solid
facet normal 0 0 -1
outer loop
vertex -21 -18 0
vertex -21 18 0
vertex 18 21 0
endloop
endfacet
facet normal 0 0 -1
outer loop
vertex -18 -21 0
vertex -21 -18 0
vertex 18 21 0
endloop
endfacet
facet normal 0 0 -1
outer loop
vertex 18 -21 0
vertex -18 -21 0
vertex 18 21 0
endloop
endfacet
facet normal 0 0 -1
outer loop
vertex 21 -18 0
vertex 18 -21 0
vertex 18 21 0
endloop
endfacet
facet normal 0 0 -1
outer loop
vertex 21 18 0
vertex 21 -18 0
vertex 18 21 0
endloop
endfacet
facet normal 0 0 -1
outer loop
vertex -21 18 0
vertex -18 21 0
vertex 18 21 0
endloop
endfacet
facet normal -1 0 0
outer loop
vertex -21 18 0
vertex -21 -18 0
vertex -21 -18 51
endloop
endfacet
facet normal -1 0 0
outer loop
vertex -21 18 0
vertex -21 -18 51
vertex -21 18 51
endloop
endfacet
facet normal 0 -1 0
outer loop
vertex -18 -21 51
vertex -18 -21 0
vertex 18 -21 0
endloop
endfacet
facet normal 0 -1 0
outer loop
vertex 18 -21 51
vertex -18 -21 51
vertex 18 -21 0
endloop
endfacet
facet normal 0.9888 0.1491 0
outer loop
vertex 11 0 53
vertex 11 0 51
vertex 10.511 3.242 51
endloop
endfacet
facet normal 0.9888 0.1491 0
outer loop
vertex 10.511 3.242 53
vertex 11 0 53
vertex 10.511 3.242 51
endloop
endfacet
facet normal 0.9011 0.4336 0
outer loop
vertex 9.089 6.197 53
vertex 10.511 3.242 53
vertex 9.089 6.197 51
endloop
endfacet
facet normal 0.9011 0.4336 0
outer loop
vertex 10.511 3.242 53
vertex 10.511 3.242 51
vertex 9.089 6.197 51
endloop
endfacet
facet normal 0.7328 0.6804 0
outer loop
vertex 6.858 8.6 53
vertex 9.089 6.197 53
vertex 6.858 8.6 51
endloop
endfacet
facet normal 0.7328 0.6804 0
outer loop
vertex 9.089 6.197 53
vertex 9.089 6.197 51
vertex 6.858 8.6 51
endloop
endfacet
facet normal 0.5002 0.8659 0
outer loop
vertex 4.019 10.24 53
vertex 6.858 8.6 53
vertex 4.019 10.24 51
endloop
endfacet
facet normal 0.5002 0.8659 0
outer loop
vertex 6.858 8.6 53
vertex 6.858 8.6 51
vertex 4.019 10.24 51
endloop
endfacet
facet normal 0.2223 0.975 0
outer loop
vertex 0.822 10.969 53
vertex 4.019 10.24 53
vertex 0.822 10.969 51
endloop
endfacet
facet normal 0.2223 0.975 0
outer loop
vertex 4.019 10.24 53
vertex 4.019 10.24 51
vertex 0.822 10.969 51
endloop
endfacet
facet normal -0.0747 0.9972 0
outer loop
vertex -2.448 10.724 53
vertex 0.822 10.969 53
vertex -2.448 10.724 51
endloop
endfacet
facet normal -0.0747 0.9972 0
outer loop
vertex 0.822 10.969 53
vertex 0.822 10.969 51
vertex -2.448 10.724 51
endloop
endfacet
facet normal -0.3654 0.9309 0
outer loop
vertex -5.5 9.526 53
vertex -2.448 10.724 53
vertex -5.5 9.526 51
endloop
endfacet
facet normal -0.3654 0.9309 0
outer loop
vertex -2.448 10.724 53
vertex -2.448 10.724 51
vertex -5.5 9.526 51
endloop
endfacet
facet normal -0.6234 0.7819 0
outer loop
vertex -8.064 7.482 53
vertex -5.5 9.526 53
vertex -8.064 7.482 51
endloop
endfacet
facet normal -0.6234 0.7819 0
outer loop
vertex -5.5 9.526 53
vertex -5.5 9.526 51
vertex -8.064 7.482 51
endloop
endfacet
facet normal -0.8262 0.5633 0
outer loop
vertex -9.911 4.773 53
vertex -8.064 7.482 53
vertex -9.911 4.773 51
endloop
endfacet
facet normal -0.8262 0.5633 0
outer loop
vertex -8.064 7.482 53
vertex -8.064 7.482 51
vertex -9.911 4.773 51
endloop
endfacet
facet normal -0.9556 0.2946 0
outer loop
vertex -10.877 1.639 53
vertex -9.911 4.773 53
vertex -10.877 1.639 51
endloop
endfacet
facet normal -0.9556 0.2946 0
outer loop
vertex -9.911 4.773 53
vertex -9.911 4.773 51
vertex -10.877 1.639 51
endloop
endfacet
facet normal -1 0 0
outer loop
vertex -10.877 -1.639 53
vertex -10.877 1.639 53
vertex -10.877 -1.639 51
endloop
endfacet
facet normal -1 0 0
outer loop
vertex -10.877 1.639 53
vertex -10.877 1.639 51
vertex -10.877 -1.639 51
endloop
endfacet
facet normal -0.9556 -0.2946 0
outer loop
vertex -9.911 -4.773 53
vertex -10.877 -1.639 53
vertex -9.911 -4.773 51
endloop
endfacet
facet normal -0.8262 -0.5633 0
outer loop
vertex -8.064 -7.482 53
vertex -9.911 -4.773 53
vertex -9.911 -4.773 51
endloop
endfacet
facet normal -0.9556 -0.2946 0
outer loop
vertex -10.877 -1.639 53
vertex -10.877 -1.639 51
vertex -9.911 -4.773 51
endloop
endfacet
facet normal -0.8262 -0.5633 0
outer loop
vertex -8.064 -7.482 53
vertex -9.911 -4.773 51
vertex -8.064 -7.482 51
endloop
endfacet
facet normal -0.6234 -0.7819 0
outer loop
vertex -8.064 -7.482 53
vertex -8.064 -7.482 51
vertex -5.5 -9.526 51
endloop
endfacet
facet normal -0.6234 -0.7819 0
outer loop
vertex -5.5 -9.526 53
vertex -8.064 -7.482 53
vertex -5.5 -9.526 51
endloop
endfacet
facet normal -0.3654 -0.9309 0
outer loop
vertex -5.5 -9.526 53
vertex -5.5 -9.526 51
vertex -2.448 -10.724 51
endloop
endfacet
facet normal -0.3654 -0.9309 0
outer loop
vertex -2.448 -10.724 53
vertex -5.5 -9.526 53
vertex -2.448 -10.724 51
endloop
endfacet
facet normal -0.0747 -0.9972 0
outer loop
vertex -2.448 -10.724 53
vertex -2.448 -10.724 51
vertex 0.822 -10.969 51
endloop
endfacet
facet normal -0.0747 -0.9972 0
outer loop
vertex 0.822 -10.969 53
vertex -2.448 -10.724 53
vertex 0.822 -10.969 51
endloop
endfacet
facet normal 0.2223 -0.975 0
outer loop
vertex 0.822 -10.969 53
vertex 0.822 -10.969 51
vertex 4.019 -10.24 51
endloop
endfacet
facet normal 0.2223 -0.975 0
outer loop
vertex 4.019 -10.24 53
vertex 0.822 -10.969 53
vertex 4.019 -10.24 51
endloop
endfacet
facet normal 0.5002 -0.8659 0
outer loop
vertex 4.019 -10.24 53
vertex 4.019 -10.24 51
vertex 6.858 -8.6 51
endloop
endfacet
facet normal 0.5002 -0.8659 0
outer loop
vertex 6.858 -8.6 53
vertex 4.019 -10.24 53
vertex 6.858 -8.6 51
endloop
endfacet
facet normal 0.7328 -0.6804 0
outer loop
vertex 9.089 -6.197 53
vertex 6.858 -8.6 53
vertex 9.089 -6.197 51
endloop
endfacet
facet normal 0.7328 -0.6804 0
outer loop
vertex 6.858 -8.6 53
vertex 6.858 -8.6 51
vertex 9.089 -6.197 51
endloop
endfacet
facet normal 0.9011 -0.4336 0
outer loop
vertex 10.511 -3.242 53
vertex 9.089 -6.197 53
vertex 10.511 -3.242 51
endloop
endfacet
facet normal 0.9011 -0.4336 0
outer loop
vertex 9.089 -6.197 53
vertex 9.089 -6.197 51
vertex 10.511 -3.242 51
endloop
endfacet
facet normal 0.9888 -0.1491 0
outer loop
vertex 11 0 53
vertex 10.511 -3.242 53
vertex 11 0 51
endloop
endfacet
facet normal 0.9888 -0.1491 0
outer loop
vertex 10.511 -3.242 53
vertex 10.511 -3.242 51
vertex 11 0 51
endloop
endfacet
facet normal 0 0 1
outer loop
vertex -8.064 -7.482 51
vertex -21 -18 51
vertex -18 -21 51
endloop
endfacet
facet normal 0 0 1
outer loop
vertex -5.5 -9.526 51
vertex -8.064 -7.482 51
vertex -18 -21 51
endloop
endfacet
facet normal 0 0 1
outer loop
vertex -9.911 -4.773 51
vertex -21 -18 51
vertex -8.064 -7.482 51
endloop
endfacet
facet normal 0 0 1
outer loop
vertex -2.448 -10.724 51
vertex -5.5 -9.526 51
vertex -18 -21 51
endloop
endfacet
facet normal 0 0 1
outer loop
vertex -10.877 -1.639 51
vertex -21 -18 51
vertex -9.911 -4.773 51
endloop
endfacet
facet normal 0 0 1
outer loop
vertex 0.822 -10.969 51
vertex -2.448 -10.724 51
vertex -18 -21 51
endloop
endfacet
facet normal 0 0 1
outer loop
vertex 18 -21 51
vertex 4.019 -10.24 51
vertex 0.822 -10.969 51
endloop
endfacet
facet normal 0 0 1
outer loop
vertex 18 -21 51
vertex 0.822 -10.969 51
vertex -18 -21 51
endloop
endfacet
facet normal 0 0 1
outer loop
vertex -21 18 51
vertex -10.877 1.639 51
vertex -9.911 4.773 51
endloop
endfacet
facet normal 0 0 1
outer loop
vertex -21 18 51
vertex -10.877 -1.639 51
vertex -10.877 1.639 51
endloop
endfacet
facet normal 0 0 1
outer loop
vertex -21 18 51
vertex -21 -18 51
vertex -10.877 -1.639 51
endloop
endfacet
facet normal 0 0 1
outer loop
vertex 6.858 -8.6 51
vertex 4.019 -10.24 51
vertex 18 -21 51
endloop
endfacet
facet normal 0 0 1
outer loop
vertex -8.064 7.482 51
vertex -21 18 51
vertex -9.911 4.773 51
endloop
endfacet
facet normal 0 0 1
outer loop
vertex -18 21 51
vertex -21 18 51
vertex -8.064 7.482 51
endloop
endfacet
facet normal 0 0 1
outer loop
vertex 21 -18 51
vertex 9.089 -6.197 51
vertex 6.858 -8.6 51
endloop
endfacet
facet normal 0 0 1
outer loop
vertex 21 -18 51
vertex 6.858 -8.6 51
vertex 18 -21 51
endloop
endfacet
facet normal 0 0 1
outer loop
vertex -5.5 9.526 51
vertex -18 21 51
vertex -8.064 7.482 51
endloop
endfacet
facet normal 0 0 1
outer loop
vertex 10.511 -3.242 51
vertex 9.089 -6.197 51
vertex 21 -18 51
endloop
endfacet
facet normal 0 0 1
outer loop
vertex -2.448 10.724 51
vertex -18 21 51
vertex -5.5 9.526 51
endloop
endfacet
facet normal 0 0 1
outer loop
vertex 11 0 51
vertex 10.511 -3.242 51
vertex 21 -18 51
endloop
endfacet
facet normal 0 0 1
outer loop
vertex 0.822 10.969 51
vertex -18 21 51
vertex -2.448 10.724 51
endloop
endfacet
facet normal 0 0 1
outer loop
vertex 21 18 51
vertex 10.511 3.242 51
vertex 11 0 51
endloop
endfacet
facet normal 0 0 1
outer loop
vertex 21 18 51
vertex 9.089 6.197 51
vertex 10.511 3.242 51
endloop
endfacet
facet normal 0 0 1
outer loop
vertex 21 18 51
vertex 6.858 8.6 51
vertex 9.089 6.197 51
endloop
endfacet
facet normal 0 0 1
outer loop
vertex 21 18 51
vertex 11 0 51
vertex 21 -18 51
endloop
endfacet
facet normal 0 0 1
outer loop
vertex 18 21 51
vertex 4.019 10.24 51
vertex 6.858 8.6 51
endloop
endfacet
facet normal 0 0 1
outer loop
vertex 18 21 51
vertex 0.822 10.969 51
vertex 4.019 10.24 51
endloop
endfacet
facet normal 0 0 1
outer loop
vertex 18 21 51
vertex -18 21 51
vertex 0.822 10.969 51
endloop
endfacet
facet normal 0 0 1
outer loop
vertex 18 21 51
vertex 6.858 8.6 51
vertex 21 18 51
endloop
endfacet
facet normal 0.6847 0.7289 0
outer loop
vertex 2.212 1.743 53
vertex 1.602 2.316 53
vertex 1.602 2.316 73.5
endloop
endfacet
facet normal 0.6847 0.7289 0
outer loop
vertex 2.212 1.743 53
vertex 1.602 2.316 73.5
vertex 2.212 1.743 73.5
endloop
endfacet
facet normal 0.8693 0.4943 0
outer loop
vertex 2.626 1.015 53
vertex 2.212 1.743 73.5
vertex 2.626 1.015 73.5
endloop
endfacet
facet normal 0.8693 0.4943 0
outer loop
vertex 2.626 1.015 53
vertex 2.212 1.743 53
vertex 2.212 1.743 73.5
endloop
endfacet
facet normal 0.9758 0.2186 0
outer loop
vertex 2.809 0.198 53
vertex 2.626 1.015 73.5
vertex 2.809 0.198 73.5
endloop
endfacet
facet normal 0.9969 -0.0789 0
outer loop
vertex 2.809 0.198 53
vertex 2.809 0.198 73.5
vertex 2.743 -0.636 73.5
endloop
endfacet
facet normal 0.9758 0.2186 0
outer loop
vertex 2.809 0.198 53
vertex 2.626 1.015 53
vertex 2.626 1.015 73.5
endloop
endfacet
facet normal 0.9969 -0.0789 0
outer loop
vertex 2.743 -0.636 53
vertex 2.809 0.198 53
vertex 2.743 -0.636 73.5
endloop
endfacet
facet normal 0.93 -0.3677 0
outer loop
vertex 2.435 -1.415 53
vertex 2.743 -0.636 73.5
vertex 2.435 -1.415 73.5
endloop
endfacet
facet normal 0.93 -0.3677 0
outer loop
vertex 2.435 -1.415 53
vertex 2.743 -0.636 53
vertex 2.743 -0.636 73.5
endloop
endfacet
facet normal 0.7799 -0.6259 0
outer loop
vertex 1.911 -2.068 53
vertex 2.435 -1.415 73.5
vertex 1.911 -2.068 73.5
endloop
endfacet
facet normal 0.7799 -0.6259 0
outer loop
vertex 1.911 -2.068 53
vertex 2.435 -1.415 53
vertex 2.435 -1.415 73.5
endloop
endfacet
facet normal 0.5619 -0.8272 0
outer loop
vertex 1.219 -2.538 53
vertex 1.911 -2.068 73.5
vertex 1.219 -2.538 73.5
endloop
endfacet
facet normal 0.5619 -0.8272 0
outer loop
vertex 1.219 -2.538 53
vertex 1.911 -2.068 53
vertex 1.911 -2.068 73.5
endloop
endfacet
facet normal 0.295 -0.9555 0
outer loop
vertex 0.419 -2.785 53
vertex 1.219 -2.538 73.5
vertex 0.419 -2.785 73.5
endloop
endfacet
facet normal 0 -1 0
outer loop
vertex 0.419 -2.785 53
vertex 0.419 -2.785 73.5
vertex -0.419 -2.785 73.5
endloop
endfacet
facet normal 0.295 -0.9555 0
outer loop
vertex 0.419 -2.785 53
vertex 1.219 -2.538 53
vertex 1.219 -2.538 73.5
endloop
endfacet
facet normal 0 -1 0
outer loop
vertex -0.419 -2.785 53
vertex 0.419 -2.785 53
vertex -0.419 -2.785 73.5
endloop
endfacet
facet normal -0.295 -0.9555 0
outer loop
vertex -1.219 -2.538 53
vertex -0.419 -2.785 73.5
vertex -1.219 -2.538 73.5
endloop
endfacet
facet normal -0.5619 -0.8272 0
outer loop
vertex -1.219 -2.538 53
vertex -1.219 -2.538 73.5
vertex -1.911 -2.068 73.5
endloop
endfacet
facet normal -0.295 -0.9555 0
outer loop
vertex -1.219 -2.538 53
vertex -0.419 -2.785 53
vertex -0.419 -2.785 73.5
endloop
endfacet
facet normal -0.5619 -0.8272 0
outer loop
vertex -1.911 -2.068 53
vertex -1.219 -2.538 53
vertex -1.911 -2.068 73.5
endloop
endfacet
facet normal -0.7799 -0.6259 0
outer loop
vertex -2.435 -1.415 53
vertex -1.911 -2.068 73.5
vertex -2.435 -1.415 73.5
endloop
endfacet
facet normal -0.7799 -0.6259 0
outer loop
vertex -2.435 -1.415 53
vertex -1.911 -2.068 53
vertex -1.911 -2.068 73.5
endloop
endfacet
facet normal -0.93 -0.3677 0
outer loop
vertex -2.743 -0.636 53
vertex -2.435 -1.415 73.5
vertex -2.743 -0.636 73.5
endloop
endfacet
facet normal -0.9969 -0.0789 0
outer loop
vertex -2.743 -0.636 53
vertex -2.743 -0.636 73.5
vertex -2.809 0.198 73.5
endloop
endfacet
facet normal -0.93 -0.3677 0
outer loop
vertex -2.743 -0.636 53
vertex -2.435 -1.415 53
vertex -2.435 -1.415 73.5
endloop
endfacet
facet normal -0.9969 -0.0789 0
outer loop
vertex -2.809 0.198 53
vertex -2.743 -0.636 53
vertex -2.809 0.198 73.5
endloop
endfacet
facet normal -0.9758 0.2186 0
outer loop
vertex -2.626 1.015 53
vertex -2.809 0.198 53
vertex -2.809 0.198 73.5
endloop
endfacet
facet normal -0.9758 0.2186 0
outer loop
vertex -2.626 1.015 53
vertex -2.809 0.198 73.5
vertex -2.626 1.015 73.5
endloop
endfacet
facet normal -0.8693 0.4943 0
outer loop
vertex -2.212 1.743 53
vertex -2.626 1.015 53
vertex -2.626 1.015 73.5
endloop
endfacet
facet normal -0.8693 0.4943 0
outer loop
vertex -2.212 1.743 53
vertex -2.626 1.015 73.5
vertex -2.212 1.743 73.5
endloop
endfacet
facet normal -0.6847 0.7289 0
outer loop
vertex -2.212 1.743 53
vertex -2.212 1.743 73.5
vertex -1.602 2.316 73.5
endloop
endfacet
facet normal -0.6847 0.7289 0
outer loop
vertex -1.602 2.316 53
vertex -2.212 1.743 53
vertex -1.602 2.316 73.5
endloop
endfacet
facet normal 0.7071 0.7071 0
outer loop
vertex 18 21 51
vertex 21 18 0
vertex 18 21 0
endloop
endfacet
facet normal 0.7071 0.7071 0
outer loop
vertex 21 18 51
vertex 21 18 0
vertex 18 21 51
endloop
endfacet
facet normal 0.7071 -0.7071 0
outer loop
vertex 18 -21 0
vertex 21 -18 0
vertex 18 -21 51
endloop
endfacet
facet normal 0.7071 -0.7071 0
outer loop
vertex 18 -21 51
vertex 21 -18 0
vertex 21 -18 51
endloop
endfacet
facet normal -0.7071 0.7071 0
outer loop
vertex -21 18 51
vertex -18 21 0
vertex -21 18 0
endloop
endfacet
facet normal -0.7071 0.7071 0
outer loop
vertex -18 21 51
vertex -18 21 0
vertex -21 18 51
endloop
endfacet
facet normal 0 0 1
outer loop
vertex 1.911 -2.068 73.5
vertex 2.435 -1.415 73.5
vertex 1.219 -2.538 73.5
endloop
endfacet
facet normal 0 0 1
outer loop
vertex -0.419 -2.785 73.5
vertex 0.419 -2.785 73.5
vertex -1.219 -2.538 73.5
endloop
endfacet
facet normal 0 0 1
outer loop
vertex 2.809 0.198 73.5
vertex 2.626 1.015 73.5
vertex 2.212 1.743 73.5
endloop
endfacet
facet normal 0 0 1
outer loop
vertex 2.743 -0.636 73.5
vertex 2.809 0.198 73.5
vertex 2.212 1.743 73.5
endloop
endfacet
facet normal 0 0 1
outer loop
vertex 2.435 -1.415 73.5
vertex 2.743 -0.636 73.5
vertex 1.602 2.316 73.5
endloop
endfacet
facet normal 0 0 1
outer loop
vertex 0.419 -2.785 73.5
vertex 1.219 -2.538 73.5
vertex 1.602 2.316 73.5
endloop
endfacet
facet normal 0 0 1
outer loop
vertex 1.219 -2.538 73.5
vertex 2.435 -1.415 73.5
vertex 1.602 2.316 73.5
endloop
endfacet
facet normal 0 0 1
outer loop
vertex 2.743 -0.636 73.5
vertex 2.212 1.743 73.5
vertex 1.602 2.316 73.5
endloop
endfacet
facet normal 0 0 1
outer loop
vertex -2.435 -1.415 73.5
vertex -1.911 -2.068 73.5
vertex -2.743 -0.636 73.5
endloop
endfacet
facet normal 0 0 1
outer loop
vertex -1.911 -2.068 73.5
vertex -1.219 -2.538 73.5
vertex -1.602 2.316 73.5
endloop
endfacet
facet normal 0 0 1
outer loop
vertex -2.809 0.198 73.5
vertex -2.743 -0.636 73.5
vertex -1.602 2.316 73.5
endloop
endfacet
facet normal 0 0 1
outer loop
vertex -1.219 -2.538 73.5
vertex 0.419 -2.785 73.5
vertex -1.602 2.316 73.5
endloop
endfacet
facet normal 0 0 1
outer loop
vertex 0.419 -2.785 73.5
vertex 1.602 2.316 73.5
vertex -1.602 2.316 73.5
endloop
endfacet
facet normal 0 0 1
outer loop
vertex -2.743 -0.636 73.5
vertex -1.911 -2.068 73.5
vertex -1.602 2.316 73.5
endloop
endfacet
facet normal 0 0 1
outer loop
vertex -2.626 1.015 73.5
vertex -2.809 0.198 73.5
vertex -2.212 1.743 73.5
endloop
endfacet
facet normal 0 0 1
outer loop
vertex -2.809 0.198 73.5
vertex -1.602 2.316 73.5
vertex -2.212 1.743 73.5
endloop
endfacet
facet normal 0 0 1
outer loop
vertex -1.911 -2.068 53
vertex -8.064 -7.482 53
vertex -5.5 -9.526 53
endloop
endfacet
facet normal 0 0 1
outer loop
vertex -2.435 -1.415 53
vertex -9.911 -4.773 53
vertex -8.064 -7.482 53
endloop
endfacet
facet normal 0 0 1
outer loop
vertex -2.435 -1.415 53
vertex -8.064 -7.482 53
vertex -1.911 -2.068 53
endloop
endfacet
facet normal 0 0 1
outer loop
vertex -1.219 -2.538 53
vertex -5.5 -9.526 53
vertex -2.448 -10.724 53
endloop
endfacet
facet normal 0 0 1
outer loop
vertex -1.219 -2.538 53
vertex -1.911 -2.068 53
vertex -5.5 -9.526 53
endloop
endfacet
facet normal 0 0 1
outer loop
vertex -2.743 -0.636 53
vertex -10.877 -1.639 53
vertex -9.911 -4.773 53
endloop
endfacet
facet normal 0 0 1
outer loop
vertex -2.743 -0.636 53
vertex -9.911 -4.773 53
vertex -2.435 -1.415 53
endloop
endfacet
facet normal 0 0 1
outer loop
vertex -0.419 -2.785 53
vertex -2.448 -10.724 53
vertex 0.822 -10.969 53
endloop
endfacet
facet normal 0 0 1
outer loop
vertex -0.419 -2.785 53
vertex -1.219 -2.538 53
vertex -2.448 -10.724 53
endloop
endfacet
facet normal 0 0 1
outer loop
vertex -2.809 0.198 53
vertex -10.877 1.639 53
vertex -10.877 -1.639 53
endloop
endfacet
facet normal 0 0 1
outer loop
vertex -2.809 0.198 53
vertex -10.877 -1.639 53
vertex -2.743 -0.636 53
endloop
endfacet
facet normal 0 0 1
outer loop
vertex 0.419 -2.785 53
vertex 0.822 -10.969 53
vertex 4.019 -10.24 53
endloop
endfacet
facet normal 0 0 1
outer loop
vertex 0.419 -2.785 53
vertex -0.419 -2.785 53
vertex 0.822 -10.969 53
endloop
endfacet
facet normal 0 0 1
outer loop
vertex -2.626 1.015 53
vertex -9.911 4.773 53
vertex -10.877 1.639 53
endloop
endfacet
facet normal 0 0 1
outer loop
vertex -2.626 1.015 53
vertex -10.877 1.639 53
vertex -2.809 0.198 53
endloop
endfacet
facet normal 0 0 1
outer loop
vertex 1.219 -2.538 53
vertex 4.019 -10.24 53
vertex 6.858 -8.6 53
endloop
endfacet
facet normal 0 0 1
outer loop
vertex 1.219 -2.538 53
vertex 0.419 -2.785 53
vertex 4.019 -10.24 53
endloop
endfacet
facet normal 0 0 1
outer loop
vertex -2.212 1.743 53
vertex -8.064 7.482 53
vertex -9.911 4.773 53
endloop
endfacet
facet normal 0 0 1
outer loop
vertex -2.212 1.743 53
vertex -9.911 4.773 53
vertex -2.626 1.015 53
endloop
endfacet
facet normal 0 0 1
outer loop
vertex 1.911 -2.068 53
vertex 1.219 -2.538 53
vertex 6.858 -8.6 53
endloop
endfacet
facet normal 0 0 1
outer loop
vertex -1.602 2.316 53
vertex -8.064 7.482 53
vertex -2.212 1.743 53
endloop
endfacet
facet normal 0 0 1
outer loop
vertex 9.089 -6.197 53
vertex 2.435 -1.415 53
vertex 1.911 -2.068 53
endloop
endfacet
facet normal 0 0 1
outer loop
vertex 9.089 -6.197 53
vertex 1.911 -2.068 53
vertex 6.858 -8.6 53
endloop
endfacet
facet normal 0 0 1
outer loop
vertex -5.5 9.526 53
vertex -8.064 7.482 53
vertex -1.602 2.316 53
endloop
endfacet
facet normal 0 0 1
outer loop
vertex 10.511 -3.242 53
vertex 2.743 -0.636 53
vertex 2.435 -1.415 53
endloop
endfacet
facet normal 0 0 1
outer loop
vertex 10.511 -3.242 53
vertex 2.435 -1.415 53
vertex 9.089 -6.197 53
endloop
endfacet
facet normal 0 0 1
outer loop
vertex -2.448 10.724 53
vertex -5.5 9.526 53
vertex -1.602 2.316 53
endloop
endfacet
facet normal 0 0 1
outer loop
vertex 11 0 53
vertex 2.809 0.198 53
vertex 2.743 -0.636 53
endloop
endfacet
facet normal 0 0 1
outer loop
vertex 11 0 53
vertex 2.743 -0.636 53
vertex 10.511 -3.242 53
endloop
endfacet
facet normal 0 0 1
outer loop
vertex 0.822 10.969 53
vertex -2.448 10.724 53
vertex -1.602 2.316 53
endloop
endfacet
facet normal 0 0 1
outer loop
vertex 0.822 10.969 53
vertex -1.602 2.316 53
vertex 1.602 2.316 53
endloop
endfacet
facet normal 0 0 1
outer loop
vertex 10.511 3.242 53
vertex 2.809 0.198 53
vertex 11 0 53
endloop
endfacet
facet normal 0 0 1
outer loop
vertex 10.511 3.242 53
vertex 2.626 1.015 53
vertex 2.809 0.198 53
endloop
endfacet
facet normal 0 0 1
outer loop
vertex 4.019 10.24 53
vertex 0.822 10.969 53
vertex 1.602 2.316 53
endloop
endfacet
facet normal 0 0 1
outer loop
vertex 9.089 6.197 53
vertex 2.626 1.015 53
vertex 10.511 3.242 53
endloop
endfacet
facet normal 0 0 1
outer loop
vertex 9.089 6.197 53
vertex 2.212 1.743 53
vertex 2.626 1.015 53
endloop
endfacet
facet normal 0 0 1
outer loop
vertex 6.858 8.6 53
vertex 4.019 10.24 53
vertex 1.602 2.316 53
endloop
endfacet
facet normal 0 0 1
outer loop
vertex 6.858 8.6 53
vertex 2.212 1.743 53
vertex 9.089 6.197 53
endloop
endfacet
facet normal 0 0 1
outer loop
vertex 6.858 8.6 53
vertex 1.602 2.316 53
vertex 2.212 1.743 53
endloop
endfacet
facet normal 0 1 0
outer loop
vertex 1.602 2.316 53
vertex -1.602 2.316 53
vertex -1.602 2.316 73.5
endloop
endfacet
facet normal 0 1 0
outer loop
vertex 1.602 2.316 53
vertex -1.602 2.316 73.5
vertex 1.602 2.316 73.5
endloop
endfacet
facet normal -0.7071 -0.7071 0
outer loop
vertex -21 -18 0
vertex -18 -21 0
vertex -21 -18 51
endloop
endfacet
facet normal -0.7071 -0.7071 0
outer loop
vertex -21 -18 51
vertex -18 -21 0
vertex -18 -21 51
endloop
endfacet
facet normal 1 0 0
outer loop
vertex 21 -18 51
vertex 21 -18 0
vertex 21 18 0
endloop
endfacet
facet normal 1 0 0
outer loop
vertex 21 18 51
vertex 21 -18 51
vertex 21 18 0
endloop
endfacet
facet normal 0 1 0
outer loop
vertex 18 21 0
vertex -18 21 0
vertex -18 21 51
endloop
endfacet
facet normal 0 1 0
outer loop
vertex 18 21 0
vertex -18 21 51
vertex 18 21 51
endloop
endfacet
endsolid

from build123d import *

# Parameters (mm, degrees)
SKETCH_1_W      = 42
SKETCH_1_H      = 42
EXTRUDE_1_DEPTH = 51
SKETCH_2_R      = 11
EXTRUDE_2_DEPTH = 2
EXTRUDE_3_DEPTH = 20.5
CHAMFER_1_SIZE  = 3


with BuildPart() as part:
    # 草图1 → 凸台-拉伸1 (new body)
    with BuildSketch(Plane.XY):
        Rectangle(SKETCH_1_W, SKETCH_1_H)
    extrude(amount=EXTRUDE_1_DEPTH)

    # 草图2 → 凸台-拉伸2 (add)
    with BuildSketch(Plane.XY.offset(51)):
        Circle(SKETCH_2_R)
    extrude(amount=EXTRUDE_2_DEPTH)

    # 草图3 → 凸台-拉伸3 (add)
    with BuildSketch(Plane.XY.offset(53)):
        with BuildLine():
            Line((-1.601826622, 2.315848528), (1.601826622, 2.315848528))
            ThreePointArc((1.601826622, 2.315848528), (0, -2.815848528), (-1.601826622, 2.315848528))
        make_face()
    extrude(amount=EXTRUDE_3_DEPTH)

    # 倒角1
    chamfer_1_edges = [part.edges().sort_by_distance(p)[0] for p in [
        (21, -21, 25.5),
        (-21, -21, 25.5),
        (-21, 21, 25.5),
        (21, 21, 25.5),
    ]]
    chamfer(chamfer_1_edges, length=CHAMFER_1_SIZE)


solid = part.part
